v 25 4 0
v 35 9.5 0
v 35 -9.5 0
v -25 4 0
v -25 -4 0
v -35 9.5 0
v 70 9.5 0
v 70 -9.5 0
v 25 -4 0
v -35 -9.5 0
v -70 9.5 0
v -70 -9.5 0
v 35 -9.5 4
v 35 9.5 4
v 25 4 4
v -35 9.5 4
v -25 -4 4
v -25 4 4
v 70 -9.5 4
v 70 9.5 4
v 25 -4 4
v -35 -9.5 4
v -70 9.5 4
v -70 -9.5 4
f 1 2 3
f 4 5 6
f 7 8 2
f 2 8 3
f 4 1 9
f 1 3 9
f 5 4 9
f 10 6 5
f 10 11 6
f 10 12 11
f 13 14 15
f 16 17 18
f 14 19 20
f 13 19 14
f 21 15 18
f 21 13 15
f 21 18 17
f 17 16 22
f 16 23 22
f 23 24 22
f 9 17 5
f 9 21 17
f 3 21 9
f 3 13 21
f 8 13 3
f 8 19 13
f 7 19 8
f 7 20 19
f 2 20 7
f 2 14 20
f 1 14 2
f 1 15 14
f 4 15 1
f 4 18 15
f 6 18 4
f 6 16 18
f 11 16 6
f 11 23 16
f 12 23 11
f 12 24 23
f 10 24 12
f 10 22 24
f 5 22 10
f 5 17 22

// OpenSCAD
// Flat tensile test specimen (dog bone) for printed plastics
// Print orientation: lying flat on the bed, symmetric about the origin in X and Y

// ---------------- Dimensions (mm) ----------------
thickness      = 4;    // specimen thickness (Z)
total_length   = 140;  // overall length (X)
gauge_width    = 8;    // width of narrow gauge section (Y)
gauge_length   = 50;   // length of gauge section (X)
grip_width     = 19;   // width of grip sections (Y)
grip_length    = 35;   // length of each grip section (X)
trans_length   = 10;   // length of each linear transition (X)

// ---------------- Derived values ----------------
x_gauge = gauge_length / 2;                 // gauge ends at +/- 25
x_trans = x_gauge + trans_length;           // transition ends at +/- 35
x_end   = x_trans + grip_length;            // grip ends at +/- 70
hg      = gauge_width / 2;                  // half gauge width
hw      = grip_width / 2;                   // half grip width

// Sanity check: sections add up to total length
assert(abs(2 * x_end - total_length) < 1e-6,
       "Section lengths do not sum to total_length");

// ---------------- Model ----------------
linear_extrude(height = thickness)
    polygon(points = [
        [-x_end,   -hw],
        [-x_trans, -hw],
        [-x_gauge, -hg],
        [ x_gauge, -hg],
        [ x_trans, -hw],
        [ x_end,   -hw],
        [ x_end,    hw],
        [ x_trans,  hw],
        [ x_gauge,  hg],
        [-x_gauge,  hg],
        [-x_trans,  hw],
        [-x_end,    hw]
    ]);
